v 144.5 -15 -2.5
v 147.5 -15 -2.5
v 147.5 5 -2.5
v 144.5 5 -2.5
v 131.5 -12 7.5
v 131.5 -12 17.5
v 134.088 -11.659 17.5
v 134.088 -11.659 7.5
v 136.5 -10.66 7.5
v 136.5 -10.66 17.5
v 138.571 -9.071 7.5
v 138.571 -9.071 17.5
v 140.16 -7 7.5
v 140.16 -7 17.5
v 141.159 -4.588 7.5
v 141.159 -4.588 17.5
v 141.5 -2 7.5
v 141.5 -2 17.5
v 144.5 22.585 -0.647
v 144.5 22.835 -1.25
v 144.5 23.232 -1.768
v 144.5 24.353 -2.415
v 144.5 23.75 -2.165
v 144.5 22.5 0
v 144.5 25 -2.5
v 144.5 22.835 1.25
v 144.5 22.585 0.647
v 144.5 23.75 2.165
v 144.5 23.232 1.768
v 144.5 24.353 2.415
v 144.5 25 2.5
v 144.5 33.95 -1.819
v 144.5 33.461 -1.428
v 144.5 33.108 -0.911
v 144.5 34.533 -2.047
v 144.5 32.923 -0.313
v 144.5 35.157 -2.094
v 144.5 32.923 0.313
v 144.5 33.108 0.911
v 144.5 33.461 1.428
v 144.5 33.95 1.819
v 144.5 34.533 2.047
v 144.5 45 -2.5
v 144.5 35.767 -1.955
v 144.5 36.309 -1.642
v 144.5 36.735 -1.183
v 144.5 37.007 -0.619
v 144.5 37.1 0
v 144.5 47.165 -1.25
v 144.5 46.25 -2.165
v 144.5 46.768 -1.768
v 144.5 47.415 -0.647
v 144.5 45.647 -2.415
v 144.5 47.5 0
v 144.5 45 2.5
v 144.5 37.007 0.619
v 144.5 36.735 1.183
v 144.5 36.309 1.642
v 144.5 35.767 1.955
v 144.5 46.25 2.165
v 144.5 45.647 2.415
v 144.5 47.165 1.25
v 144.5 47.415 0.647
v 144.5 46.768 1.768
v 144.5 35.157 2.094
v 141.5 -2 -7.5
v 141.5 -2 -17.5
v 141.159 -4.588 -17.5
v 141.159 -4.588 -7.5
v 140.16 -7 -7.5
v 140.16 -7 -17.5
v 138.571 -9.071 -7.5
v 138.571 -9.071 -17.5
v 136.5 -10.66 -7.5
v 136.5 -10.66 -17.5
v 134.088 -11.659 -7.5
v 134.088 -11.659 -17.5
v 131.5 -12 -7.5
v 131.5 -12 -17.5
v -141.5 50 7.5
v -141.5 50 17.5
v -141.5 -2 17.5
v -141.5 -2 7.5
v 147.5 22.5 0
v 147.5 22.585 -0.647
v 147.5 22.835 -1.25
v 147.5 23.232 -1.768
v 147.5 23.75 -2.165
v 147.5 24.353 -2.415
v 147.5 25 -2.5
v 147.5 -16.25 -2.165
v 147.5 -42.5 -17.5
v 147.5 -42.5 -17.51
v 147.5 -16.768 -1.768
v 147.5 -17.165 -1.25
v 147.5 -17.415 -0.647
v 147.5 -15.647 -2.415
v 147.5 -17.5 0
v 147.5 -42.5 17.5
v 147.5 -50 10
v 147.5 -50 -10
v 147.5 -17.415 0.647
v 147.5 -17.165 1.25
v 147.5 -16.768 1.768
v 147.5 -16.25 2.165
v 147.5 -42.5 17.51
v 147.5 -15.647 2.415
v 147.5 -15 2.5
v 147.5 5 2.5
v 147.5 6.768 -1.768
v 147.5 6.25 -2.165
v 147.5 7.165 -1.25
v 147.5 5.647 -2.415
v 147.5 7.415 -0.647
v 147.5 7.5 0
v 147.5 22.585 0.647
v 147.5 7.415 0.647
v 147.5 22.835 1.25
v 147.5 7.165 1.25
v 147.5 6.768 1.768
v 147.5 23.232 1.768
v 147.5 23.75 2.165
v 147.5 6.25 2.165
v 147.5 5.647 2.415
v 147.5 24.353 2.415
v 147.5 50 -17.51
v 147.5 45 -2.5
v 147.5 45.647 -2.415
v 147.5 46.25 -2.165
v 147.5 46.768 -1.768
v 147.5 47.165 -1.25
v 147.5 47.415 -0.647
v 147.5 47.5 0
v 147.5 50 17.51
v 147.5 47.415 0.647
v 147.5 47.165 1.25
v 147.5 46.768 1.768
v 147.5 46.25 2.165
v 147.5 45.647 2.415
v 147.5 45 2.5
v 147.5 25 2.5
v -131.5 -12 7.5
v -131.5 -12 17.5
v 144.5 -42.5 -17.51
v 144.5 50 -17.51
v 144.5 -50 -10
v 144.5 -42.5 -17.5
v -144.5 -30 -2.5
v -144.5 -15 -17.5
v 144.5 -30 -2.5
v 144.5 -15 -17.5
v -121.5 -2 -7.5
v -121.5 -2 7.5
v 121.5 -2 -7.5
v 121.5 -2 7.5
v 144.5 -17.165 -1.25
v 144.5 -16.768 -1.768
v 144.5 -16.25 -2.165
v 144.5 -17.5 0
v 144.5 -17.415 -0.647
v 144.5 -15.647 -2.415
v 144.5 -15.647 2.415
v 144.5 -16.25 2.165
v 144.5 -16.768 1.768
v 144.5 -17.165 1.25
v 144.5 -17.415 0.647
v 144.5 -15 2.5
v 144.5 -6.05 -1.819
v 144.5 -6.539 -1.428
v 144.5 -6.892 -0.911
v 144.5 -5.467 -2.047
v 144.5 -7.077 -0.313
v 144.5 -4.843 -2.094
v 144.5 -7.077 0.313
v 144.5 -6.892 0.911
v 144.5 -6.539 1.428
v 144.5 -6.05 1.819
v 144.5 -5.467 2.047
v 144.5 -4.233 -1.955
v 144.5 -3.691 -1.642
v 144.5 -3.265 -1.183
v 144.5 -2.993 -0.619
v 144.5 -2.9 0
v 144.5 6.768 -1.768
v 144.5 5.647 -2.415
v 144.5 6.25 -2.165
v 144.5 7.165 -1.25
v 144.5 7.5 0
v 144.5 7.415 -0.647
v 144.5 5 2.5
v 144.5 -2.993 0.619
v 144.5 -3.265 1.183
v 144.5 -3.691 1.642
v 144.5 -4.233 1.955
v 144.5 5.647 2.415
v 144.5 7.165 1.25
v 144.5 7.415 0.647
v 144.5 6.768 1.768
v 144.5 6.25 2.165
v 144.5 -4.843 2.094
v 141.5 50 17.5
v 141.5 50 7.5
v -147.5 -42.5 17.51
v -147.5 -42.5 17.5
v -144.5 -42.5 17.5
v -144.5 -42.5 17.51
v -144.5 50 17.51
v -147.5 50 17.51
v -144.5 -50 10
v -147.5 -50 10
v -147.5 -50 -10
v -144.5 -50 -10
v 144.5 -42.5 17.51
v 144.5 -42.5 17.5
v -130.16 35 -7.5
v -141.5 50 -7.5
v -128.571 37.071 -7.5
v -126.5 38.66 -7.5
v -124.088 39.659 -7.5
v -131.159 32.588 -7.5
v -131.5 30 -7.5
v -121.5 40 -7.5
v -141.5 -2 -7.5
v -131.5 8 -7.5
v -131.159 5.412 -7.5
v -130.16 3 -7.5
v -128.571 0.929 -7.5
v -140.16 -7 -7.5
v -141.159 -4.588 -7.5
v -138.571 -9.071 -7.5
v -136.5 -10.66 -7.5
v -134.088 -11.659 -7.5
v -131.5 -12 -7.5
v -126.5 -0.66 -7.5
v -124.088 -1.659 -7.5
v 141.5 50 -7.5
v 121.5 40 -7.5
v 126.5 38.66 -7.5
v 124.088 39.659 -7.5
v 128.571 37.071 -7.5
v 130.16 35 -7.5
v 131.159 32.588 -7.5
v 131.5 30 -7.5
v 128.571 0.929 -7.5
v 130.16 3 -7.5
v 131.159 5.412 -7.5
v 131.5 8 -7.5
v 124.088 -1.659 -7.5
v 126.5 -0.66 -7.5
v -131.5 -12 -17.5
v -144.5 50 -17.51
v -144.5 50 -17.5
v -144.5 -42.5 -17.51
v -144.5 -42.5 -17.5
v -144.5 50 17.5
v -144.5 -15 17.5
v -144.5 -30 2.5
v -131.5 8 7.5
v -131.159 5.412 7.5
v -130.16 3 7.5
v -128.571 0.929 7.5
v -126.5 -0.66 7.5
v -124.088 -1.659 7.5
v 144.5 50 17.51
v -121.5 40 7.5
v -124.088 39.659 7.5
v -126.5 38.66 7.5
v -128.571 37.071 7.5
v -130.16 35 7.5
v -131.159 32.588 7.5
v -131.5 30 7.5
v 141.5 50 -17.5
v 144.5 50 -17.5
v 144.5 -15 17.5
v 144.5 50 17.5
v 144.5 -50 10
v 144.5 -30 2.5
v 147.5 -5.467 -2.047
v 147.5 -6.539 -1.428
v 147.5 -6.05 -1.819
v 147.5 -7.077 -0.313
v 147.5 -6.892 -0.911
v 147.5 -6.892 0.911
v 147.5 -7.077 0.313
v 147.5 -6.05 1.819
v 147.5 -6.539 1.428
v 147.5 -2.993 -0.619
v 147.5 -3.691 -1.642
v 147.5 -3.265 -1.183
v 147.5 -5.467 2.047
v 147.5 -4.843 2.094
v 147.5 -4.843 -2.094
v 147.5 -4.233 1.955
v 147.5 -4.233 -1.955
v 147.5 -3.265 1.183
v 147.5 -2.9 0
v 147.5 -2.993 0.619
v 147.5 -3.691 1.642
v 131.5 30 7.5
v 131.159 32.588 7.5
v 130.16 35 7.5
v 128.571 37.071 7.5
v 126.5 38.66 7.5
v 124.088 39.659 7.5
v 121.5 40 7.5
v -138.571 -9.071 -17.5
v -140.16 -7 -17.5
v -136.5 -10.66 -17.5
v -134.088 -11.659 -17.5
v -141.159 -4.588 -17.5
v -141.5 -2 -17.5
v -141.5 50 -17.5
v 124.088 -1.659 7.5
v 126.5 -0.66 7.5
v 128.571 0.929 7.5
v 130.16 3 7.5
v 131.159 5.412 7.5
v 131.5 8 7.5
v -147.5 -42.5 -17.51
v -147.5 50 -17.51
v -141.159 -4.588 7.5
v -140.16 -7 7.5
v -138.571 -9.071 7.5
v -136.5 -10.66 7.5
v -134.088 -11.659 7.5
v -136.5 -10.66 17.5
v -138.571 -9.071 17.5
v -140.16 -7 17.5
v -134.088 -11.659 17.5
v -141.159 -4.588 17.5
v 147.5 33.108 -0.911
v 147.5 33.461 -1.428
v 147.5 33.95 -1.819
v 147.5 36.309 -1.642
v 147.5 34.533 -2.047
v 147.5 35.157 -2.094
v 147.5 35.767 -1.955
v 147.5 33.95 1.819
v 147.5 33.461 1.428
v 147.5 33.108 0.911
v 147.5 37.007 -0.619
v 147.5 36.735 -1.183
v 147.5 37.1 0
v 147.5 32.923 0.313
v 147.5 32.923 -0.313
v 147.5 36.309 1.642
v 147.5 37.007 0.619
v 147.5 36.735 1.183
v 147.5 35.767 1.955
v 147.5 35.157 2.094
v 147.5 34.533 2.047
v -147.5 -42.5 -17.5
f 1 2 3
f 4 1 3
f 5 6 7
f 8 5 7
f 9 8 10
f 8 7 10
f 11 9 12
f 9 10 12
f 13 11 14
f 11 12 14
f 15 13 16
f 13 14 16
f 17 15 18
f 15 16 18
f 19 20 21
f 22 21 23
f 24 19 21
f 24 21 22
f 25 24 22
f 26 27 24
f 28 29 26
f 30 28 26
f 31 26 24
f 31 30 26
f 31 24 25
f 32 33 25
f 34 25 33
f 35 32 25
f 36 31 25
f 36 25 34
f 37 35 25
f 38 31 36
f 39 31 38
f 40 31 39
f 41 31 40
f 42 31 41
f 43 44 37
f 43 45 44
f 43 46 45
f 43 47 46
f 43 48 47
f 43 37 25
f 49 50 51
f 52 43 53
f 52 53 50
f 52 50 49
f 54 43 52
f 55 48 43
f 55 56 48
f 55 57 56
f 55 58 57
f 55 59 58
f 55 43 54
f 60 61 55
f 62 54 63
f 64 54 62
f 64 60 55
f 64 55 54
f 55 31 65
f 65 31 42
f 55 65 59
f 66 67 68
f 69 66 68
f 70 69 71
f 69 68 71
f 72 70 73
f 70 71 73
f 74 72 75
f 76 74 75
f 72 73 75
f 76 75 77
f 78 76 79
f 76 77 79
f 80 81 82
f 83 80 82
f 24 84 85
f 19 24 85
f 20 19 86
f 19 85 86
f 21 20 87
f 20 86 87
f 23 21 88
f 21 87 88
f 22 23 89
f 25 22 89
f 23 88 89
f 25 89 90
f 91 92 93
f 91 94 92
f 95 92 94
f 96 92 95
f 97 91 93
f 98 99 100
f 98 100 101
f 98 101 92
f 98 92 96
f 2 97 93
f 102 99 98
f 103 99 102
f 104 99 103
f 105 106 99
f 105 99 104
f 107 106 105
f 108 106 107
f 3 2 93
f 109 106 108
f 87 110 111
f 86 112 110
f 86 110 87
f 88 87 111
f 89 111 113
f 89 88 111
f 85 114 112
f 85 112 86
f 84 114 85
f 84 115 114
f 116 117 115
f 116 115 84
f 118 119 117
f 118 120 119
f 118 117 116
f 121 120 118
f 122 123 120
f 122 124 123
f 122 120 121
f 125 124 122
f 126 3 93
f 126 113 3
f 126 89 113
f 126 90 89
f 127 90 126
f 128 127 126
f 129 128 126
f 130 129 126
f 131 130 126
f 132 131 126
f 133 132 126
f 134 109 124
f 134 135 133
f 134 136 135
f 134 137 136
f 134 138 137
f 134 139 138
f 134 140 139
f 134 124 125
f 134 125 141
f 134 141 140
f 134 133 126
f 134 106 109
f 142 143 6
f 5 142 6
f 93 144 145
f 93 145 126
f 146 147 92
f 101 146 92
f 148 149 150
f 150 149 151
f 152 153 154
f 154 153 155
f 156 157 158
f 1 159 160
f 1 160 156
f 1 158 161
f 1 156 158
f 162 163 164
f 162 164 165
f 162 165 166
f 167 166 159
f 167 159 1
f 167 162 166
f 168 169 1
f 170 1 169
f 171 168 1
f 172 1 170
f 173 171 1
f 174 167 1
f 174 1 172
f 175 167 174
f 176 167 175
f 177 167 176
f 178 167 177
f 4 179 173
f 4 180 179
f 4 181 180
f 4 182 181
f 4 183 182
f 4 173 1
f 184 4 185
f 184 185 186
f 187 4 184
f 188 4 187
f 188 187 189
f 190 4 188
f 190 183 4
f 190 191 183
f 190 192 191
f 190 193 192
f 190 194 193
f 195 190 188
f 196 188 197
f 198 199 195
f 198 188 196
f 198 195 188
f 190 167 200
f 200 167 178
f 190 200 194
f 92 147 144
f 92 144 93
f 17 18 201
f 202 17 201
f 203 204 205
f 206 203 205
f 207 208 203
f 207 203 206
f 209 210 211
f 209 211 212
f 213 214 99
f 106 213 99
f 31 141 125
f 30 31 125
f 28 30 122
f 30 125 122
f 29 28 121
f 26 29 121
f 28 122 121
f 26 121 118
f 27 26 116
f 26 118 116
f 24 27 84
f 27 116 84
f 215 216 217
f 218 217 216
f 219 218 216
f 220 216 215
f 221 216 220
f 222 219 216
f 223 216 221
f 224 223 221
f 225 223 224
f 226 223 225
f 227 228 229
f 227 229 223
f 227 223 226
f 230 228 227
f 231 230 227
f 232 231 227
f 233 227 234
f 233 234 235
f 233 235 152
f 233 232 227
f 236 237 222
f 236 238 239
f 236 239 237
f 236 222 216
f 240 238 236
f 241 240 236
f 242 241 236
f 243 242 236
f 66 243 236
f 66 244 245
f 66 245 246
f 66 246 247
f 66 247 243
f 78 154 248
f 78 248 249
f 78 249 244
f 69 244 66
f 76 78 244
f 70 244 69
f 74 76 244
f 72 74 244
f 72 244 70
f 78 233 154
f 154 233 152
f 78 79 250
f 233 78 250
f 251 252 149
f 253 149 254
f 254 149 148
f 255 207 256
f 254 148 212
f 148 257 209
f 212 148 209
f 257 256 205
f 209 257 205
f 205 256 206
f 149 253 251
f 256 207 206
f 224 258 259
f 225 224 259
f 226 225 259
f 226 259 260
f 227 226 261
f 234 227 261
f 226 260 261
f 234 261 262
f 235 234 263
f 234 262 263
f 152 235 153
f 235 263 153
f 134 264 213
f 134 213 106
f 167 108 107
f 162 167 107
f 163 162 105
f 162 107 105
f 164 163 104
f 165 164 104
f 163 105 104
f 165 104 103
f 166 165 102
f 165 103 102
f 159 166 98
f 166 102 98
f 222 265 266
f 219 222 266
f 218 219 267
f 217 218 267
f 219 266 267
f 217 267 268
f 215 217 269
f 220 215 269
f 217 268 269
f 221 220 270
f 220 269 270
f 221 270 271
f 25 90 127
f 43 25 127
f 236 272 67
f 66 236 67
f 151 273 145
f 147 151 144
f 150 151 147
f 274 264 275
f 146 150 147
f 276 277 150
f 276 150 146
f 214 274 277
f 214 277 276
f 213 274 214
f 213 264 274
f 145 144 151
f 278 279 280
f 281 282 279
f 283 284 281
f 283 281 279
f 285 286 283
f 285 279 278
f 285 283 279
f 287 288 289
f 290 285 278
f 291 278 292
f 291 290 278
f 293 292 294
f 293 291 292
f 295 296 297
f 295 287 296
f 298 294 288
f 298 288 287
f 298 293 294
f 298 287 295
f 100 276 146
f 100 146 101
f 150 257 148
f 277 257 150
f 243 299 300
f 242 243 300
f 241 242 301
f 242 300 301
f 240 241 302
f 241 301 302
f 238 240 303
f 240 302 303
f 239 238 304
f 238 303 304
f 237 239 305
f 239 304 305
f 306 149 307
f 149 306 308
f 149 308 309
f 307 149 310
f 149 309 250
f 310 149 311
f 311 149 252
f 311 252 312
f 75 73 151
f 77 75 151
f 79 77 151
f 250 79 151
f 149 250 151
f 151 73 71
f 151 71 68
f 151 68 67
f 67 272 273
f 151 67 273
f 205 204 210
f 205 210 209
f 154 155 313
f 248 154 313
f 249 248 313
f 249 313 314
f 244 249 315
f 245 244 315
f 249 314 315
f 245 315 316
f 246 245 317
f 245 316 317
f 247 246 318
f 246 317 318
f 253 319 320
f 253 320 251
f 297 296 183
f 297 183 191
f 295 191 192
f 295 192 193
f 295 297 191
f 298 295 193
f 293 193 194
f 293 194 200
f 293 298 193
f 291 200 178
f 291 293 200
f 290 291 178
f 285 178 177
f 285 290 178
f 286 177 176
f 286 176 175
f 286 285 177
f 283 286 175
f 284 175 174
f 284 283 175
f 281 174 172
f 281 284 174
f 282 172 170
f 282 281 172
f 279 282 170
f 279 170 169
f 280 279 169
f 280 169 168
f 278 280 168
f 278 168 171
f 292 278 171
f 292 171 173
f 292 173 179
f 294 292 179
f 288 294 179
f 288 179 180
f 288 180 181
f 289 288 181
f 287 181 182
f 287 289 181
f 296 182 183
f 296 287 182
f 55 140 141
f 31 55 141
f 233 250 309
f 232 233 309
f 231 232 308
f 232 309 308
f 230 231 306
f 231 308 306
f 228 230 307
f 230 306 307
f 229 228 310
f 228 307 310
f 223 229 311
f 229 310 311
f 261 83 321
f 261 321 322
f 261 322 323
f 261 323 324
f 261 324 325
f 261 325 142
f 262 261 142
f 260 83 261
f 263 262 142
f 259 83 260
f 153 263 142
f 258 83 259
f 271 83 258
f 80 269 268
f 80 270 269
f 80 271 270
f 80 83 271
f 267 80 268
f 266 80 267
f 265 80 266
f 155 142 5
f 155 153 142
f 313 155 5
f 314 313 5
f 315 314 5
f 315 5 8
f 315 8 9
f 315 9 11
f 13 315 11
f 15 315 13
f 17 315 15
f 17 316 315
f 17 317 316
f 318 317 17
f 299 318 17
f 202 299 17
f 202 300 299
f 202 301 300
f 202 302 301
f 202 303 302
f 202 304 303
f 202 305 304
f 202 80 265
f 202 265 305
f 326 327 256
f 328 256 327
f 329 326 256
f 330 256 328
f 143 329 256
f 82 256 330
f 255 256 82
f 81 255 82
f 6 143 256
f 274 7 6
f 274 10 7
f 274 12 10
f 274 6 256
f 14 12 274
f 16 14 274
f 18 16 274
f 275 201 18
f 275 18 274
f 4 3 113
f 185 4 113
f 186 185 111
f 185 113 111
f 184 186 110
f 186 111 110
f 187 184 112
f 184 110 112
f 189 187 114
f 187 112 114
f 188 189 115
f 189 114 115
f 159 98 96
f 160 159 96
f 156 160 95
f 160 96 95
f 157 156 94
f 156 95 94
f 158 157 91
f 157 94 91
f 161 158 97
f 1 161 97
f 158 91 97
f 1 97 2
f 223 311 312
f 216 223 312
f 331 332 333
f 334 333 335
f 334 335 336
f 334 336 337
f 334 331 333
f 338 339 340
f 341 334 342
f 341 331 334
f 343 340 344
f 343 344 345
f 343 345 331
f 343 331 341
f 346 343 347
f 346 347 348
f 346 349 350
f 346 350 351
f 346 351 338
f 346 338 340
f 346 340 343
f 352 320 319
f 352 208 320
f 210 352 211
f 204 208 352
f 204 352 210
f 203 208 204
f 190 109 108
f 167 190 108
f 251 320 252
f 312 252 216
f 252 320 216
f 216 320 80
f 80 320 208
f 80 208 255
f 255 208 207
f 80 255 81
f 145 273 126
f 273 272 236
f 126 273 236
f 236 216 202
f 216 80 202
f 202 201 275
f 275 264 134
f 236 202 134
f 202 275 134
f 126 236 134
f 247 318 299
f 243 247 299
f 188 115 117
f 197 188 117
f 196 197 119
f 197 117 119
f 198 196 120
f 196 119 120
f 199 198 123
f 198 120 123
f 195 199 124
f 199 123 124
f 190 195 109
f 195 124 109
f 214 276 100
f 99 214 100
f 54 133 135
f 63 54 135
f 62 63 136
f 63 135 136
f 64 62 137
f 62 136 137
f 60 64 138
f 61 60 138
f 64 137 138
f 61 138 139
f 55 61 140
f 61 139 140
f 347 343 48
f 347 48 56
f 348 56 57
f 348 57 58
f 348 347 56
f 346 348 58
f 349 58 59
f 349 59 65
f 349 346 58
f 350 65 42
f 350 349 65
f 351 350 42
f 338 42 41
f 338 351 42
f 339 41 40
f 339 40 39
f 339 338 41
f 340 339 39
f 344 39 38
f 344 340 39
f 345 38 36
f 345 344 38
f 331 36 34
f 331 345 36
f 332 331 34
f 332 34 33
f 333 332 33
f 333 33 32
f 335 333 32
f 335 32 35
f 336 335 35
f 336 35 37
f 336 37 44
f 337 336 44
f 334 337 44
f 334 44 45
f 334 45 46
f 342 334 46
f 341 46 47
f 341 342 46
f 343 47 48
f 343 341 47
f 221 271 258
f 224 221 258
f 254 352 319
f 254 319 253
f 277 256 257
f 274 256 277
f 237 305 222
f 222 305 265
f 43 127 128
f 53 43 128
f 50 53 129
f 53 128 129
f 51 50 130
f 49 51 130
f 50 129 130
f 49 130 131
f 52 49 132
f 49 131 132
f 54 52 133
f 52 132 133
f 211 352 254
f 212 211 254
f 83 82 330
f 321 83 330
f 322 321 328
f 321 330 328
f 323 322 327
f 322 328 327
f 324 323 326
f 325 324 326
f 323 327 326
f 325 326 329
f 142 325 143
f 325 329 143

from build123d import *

# Parameters (mm, degrees)
F1_DEPTH      = 17.5
F1_DEPTH_BACK = 17.5
F2_SIZE       = 15
F3_SIZE       = 7.5
F5_W          = 3
F5_H          = 92.5
F6_DEPTH      = 0.01
F7_W          = 3
F7_H          = 92.5
F8_DEPTH      = 0.01
F4_R          = 2.1
F9_DEPTH      = 3
F11_DEPTH     = 10
F13_DEPTH     = 10
F15_DEPTH     = 25


with BuildPart() as f1:
    # F0 (on Top) → F1 (new body, two sides)
    with BuildSketch(Plane.XY) as f1_sk:
        Polygon((147.5, -50), (147.5, 50), (-147.5, 50), (-147.5, -50), (-144.5, -50), (-144.5, -30), (144.5, -30), (144.5, -50), align=None)
    extrude(amount=F1_DEPTH)
    extrude(f1_sk.sketch, amount=-F1_DEPTH_BACK)

    # F2
    f2_edges = [f1.edges().sort_by_distance(p)[0] for p in [
        (0, -30, 17.5),
        (0, -30, -17.5),
    ]]
    chamfer(f2_edges, length=F2_SIZE)

    # F3
    f3_edges = [f1.edges().sort_by_distance(p)[0] for p in [
        (146, -50, 17.5),
        (146, -50, -17.5),
        (-146, -50, 17.5),
        (-146, -50, -17.5),
    ]]
    chamfer(f3_edges, length=F3_SIZE)

    # F5 (on face) → F6 (join)
    with BuildSketch(Plane.XY.offset(17.5)):
        with Locations((-146, 3.75)):
            Rectangle(F5_W, F5_H)
        with Locations((146, 3.75)):
            Rectangle(F5_W, F5_H)
    extrude(amount=F6_DEPTH)

    # F7 (on face) → F8 (join)
    with BuildSketch(Plane(origin=(0, 0, -17.5), x_dir=(1, 0, 0), z_dir=(0, 0, -1))):
        with Locations((-146, -3.75)):
            Rectangle(F7_W, F7_H)
        with Locations((146, -3.75)):
            Rectangle(F7_W, F7_H)
    extrude(amount=F8_DEPTH)

    # F4 (on face) → F9 (cut)
    with BuildSketch(Plane.YZ.offset(147.5)):
        with BuildLine():
            ThreePointArc((47.5, 0), (46.767767, 1.767767), (45, 2.5))
            Line((45, 2.5), (25, 2.5))
            ThreePointArc((25, 2.5), (23.232233, 1.767767), (22.5, 0))
            ThreePointArc((22.5, 0), (23.232233, -1.767767), (25, -2.5))
            Line((25, -2.5), (45, -2.5))
            ThreePointArc((45, -2.5), (46.767767, -1.767767), (47.5, 0))
        make_face()
        with Locations((35, 0)):
            Circle(F4_R, mode=Mode.SUBTRACT)
        with BuildLine():
            ThreePointArc((7.5, 0), (6.767767, 1.767767), (5, 2.5))
            Line((5, 2.5), (-15, 2.5))
            ThreePointArc((-15, 2.5), (-16.767767, 1.767767), (-17.5, 0))
            ThreePointArc((-17.5, 0), (-16.767767, -1.767767), (-15, -2.5))
            Line((-15, -2.5), (5, -2.5))
            ThreePointArc((5, -2.5), (6.767767, -1.767767), (7.5, 0))
        make_face()
        with Locations((-5, 0)):
            Circle(F4_R, mode=Mode.SUBTRACT)
    extrude(amount=-F9_DEPTH, mode=Mode.SUBTRACT)

    # F10 (on face) → F11 (cut)
    with BuildSketch(Plane.XY.offset(17.5)):
        with BuildLine():
            Line((141.5, 50), (-141.5, 50))
            Line((-141.5, 50), (-141.5, -2))
            ThreePointArc((-141.5, -2), (-138.571068, -9.071068), (-131.5, -12))
            Line((-131.5, -12), (131.5, -12))
            ThreePointArc((131.5, -12), (138.571068, -9.071068), (141.5, -2))
            Line((141.5, -2), (141.5, 50))
        make_face()
    extrude(amount=-F11_DEPTH, mode=Mode.SUBTRACT)

    # F12 (on face) → F13 (cut)
    with BuildSketch(Plane(origin=(0, 0, -17.5), x_dir=(1, 0, 0), z_dir=(0, 0, -1))):
        with BuildLine():
            Line((141.5, -50), (141.5, 2))
            ThreePointArc((141.5, 2), (138.571068, 9.071068), (131.5, 12))
            Line((131.5, 12), (-131.5, 12))
            ThreePointArc((-131.5, 12), (-138.571068, 9.071068), (-141.5, 2))
            Line((-141.5, 2), (-141.5, -50))
            Line((-141.5, -50), (141.5, -50))
        make_face()
    extrude(amount=-F13_DEPTH, mode=Mode.SUBTRACT)

    # F14 (on face) → F15 (cut)
    with BuildSketch(Plane.XY.offset(7.5)):
        with BuildLine():
            Line((121.5, 40), (-121.5, 40))
            ThreePointArc((-121.5, 40), (-128.571068, 37.071068), (-131.5, 30))
            Line((-131.5, 30), (-131.5, 8))
            ThreePointArc((-131.5, 8), (-128.571068, 0.928932), (-121.5, -2))
            Line((-121.5, -2), (121.5, -2))
            ThreePointArc((121.5, -2), (128.571068, 0.928932), (131.5, 8))
            Line((131.5, 8), (131.5, 30))
            ThreePointArc((131.5, 30), (128.571068, 37.071068), (121.5, 40))
        make_face()
    extrude(amount=-F15_DEPTH, mode=Mode.SUBTRACT)


solid = f1.part
